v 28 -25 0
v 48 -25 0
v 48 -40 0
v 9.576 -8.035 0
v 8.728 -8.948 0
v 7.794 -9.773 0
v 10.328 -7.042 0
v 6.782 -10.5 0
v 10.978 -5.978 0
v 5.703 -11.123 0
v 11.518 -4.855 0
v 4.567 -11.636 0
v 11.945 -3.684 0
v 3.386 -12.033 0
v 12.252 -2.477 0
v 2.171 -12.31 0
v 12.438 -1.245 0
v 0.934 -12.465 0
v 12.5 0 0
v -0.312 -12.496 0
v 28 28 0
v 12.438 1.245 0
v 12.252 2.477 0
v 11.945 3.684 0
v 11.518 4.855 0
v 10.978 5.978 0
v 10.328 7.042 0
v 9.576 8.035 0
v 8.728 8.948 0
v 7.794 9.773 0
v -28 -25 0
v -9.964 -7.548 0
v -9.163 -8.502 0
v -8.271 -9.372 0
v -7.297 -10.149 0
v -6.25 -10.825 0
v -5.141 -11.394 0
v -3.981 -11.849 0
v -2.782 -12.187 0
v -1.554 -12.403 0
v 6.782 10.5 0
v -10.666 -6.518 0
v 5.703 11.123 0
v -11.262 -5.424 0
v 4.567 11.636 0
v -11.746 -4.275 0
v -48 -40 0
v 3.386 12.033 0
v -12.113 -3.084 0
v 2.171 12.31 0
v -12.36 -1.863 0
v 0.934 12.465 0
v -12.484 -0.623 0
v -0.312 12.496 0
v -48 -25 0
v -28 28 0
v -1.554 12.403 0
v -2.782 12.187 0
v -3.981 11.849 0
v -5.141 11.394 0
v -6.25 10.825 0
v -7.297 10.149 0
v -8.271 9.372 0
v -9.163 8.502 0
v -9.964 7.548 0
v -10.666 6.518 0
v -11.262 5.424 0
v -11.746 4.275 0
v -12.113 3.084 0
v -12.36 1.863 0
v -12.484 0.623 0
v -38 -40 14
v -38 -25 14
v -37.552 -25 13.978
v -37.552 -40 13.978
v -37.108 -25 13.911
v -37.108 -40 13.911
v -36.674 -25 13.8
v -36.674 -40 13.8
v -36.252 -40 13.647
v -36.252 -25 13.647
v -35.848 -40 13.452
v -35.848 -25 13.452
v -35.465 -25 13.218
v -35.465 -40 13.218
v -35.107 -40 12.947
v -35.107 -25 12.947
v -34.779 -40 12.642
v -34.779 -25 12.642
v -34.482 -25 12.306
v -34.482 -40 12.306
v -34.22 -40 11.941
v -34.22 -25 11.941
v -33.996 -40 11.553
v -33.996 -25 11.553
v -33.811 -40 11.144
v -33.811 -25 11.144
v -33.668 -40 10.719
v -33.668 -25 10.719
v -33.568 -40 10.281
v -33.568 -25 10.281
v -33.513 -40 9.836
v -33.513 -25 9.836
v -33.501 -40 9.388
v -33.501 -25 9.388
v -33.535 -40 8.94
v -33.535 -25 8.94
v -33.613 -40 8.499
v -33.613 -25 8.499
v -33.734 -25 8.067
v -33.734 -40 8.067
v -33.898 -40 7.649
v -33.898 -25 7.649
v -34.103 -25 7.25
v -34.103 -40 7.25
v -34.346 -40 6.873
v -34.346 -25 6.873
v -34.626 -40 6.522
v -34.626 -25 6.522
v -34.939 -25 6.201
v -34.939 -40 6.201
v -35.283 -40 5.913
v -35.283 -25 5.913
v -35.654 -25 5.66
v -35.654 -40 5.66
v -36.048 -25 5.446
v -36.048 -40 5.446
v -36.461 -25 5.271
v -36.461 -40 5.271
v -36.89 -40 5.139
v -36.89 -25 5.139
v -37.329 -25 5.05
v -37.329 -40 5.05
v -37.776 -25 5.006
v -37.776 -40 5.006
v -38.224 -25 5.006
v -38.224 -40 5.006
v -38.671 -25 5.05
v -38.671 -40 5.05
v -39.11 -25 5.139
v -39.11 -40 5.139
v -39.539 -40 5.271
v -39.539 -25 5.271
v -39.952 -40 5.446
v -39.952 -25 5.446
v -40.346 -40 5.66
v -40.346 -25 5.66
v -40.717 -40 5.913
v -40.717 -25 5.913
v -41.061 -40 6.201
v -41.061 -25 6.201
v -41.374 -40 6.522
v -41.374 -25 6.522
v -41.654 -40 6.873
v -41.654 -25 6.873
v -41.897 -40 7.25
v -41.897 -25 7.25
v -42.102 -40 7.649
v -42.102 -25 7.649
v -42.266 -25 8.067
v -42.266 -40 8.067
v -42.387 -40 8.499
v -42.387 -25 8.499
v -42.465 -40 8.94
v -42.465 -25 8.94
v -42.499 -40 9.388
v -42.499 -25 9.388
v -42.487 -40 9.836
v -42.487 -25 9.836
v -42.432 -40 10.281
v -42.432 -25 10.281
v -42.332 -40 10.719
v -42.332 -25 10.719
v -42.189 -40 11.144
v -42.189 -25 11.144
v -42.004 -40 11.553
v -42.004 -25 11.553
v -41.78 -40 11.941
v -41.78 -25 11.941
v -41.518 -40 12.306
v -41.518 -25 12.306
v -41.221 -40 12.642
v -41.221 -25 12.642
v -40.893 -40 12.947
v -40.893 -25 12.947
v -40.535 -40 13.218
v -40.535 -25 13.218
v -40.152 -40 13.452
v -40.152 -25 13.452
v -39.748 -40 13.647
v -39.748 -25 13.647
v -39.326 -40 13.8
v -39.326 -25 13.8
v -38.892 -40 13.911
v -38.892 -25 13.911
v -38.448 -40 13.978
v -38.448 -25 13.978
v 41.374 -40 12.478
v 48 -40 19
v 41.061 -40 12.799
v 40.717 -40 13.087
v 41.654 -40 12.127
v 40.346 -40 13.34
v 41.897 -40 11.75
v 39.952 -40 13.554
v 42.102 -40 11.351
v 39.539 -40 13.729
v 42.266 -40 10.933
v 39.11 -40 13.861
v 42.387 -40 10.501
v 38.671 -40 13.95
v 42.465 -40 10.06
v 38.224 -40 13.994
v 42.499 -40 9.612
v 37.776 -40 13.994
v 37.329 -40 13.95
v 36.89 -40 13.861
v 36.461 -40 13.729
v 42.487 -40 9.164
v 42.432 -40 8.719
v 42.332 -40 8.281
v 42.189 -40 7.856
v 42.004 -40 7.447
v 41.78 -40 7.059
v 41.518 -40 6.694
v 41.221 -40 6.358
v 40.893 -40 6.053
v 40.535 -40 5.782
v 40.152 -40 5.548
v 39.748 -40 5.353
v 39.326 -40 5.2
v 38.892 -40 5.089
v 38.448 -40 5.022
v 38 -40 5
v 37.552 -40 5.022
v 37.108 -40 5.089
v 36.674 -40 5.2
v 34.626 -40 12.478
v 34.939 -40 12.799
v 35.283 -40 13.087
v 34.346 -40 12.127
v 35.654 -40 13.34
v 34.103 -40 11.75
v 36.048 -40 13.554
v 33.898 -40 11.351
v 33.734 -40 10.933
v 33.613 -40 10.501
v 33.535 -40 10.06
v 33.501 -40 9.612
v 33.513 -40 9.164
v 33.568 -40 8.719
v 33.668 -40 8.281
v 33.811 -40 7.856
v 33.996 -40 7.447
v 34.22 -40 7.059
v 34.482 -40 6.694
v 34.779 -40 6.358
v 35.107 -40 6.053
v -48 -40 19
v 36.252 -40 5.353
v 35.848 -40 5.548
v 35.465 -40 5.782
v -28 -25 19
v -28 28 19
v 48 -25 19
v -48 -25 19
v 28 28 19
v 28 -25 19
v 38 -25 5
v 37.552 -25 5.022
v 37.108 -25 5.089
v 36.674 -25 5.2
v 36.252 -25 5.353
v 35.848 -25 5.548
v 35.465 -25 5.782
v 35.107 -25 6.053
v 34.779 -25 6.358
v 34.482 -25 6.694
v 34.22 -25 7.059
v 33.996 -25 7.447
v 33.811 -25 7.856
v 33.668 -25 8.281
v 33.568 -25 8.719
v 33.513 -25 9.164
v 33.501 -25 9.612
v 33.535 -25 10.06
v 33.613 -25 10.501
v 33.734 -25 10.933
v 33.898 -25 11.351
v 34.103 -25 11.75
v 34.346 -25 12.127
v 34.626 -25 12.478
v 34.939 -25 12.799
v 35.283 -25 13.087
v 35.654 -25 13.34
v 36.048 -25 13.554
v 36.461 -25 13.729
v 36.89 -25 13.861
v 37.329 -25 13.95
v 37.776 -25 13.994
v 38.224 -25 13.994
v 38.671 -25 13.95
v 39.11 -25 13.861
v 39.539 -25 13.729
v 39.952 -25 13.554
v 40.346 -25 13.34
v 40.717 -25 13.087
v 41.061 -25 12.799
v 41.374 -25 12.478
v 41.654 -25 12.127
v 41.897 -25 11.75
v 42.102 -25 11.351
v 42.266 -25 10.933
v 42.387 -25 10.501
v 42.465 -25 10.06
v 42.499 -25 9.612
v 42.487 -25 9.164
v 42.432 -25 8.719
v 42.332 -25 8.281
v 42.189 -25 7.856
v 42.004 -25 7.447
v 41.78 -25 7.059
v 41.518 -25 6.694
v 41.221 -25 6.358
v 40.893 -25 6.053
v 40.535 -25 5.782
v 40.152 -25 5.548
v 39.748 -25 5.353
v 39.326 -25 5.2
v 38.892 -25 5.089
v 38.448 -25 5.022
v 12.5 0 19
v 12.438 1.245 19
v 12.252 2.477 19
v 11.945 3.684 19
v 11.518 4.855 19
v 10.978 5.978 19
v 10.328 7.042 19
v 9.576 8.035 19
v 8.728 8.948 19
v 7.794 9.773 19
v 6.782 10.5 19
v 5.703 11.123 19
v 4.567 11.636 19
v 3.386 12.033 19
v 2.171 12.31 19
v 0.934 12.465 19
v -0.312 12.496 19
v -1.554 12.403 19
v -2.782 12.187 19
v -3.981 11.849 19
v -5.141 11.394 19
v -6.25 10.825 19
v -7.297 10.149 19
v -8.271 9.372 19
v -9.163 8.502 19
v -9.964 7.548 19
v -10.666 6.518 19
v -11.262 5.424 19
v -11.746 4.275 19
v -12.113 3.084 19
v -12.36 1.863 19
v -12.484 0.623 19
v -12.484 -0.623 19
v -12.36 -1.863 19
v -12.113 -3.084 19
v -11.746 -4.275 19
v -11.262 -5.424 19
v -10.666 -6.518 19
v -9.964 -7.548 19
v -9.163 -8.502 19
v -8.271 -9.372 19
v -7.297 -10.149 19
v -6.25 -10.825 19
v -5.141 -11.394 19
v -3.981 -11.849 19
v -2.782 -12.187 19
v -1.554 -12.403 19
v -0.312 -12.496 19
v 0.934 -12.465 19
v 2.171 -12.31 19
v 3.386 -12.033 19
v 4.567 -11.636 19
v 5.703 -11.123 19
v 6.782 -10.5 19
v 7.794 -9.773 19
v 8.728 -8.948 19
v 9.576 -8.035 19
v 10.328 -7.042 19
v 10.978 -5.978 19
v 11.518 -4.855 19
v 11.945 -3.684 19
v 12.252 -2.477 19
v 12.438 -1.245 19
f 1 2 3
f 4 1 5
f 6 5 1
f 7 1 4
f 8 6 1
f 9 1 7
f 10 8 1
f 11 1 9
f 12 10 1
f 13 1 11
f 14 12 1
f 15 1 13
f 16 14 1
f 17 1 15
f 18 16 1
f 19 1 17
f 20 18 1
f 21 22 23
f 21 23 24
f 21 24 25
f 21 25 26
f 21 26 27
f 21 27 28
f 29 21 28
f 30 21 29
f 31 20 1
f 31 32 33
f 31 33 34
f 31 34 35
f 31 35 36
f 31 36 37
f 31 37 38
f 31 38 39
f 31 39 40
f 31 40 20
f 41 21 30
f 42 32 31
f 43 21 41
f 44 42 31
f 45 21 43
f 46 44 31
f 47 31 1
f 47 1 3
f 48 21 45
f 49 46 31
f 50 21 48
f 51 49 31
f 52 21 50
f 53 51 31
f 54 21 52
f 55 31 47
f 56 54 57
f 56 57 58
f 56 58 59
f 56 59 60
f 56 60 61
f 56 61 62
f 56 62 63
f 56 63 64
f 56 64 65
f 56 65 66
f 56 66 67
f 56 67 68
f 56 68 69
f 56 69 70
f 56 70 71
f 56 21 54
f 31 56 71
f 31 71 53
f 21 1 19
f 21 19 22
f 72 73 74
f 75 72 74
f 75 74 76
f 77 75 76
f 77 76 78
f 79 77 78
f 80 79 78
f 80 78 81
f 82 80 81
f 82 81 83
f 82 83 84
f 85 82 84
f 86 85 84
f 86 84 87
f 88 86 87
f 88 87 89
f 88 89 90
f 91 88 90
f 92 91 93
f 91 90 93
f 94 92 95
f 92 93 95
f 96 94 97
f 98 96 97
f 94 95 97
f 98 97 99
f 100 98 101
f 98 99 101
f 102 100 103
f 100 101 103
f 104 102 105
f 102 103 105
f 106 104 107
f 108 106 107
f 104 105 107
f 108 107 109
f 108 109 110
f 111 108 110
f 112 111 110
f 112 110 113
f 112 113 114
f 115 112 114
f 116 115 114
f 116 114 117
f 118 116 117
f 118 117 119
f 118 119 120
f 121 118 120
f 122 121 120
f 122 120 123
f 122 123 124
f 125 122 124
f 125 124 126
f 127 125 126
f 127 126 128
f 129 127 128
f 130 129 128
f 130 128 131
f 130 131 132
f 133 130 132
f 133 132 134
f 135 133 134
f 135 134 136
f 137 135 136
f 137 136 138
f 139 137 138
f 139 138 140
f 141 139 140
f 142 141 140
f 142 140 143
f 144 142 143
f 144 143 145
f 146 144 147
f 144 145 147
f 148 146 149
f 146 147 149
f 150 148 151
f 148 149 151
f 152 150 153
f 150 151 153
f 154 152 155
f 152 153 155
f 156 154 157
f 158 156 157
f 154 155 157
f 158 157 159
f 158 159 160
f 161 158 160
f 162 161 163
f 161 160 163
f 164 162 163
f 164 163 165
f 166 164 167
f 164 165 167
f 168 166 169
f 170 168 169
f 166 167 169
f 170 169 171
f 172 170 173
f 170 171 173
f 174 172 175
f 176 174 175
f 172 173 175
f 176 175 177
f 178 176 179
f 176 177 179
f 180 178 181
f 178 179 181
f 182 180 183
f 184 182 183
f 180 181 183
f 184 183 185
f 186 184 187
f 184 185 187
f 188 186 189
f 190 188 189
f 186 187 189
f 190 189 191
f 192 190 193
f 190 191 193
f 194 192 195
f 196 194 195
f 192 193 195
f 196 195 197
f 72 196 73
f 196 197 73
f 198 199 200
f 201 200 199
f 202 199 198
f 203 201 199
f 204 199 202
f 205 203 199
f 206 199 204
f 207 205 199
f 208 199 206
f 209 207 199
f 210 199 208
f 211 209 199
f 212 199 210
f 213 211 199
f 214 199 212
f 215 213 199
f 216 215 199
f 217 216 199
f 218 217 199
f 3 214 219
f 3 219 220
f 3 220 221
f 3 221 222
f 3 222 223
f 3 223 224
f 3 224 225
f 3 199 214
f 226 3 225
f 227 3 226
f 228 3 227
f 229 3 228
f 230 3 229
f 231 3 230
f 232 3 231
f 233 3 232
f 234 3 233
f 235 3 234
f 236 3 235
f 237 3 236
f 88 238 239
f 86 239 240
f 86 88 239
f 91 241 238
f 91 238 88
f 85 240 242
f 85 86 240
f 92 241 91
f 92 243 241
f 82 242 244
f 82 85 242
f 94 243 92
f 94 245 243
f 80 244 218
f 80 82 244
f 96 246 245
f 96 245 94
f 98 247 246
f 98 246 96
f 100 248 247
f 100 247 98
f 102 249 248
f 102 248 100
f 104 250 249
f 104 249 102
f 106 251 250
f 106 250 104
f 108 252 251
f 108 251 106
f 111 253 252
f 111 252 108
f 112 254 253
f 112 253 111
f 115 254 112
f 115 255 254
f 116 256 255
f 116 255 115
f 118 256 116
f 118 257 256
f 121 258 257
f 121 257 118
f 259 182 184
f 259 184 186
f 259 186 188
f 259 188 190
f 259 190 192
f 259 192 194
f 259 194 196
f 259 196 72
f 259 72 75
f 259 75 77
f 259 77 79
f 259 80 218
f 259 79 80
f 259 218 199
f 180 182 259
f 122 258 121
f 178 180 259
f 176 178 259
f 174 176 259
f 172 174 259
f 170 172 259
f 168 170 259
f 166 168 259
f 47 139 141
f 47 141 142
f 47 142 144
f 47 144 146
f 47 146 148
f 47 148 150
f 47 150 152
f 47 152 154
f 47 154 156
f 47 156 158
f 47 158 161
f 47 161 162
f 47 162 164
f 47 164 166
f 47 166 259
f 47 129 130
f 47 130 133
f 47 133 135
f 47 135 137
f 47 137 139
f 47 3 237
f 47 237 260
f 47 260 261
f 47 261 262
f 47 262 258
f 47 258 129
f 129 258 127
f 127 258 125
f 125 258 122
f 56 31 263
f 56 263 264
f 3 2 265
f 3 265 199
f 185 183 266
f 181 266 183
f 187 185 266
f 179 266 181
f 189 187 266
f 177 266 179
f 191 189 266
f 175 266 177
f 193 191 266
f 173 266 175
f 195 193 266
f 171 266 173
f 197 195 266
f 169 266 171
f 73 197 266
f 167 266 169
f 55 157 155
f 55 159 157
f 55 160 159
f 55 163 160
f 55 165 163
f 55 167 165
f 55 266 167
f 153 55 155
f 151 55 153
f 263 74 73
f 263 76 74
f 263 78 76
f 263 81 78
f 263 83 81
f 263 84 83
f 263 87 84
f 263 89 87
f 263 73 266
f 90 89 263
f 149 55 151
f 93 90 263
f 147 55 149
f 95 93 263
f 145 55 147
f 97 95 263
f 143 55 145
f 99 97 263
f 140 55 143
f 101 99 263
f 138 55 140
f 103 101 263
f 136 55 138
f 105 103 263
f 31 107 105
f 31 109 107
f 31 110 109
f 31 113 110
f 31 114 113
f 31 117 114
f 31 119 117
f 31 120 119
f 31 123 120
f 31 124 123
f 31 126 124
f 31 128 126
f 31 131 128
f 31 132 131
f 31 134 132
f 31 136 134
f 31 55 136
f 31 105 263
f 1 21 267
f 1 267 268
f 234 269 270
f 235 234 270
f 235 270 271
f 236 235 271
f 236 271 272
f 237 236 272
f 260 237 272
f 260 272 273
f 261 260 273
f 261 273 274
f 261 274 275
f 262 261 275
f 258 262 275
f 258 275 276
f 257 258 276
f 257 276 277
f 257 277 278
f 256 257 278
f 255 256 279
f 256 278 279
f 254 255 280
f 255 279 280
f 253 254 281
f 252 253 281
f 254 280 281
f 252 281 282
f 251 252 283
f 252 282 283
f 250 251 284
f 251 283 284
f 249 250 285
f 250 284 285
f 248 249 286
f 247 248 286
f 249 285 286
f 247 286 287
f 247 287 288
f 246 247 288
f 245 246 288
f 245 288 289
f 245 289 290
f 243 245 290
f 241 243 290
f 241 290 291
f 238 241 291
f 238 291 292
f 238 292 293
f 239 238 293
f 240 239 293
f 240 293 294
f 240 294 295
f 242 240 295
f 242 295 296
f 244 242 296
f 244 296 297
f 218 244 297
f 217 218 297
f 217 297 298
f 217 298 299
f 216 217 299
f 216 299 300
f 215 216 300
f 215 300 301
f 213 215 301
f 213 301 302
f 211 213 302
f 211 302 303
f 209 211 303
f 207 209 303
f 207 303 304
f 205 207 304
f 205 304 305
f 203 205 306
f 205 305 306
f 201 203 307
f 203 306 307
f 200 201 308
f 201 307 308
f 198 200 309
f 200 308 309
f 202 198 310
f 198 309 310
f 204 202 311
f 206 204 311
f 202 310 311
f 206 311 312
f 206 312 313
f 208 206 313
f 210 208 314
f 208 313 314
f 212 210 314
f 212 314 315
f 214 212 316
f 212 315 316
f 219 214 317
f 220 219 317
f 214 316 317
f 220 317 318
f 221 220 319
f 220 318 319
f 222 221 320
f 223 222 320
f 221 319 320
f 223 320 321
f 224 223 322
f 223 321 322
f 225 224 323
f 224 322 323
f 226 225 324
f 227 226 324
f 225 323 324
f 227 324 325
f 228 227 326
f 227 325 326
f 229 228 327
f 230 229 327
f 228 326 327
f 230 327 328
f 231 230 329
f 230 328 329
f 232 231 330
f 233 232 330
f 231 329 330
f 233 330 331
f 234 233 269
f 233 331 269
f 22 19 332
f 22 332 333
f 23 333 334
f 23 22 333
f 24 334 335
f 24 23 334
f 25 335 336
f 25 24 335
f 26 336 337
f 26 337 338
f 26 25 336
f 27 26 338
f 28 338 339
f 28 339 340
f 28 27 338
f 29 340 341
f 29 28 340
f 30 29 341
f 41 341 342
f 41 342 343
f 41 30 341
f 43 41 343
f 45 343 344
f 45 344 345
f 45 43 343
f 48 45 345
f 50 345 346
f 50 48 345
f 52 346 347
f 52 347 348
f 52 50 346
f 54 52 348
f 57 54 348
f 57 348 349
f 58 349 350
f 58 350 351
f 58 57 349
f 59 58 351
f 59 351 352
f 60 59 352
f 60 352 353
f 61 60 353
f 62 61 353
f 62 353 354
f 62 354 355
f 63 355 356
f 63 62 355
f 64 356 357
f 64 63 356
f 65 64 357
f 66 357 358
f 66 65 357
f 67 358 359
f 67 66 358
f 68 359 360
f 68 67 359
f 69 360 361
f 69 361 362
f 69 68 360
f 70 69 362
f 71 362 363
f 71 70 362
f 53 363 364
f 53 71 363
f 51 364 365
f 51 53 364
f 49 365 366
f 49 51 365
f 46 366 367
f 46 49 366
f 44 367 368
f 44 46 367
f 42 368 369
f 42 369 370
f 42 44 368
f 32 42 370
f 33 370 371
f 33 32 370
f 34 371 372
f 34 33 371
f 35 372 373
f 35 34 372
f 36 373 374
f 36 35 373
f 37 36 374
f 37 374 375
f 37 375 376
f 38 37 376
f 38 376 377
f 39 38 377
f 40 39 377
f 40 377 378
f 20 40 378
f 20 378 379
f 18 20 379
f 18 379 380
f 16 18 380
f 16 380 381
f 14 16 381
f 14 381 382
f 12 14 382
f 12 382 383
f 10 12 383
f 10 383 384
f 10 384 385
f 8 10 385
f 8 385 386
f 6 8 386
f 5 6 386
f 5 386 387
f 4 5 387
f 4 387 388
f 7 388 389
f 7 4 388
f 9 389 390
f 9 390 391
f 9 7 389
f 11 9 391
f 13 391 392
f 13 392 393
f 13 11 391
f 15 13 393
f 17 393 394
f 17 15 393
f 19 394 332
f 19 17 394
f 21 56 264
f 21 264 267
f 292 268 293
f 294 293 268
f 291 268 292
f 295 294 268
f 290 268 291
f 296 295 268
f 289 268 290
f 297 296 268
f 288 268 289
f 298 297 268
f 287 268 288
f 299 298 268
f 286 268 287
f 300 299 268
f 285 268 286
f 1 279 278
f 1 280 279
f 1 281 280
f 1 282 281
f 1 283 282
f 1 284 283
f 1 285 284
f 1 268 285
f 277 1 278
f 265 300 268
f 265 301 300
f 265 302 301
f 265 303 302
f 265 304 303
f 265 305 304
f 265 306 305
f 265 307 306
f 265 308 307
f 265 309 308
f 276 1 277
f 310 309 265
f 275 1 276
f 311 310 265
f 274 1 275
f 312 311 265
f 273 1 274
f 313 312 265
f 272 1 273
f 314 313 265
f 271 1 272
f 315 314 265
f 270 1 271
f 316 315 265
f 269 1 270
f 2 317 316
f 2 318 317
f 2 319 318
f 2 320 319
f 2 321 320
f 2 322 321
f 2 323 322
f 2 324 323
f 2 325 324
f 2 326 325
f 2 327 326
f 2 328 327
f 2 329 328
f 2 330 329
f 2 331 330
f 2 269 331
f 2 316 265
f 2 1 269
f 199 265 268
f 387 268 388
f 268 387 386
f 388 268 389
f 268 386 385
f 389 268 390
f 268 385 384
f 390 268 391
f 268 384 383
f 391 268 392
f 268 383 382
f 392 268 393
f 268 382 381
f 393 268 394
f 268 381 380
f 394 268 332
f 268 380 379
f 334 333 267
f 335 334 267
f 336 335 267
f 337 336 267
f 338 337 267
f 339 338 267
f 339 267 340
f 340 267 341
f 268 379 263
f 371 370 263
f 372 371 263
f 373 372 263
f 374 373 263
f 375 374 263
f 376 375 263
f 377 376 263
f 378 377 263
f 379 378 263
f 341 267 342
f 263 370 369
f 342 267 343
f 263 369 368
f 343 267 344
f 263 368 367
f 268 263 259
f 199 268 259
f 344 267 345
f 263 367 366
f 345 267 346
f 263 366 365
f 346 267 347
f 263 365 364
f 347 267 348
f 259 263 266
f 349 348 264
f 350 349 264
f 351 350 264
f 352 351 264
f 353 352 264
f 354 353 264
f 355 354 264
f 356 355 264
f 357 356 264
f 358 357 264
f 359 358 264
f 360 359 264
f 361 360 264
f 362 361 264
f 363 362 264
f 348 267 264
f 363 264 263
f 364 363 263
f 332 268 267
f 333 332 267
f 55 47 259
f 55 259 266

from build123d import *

# Parameters (mm, degrees)
SKETCH_1_R          = 12.5
EXTRUDE_1_DEPTH     = 19
SKETCH_2_R          = 4.5
CUT_EXTRUDE_1_DEPTH = 74.986485252


with BuildPart() as part:
    # 草图1 → 凸台-拉伸1 (new body)
    with BuildSketch(Plane.XY):
        Polygon((-48, -40), (-48, -25), (-28, -25), (-28, 28), (28, 28), (28, -25), (48, -25), (48, -40), align=None)
        Circle(SKETCH_1_R, mode=Mode.SUBTRACT)
    extrude(amount=EXTRUDE_1_DEPTH)

    # 草图2 → 切除-拉伸1 (cut, through all)
    with BuildSketch(Plane(origin=(0, -25, 0), x_dir=(1, 0, 0), z_dir=(0, 1, 0))):
        with Locations(Location((-38, -9.5, 0), (0, 0, 270))):
            Circle(SKETCH_2_R)
        with Locations(Location((38, -9.5, 0), (0, 0, 90))):
            Circle(SKETCH_2_R)
    extrude(amount=-CUT_EXTRUDE_1_DEPTH, mode=Mode.SUBTRACT)


solid = part.part
